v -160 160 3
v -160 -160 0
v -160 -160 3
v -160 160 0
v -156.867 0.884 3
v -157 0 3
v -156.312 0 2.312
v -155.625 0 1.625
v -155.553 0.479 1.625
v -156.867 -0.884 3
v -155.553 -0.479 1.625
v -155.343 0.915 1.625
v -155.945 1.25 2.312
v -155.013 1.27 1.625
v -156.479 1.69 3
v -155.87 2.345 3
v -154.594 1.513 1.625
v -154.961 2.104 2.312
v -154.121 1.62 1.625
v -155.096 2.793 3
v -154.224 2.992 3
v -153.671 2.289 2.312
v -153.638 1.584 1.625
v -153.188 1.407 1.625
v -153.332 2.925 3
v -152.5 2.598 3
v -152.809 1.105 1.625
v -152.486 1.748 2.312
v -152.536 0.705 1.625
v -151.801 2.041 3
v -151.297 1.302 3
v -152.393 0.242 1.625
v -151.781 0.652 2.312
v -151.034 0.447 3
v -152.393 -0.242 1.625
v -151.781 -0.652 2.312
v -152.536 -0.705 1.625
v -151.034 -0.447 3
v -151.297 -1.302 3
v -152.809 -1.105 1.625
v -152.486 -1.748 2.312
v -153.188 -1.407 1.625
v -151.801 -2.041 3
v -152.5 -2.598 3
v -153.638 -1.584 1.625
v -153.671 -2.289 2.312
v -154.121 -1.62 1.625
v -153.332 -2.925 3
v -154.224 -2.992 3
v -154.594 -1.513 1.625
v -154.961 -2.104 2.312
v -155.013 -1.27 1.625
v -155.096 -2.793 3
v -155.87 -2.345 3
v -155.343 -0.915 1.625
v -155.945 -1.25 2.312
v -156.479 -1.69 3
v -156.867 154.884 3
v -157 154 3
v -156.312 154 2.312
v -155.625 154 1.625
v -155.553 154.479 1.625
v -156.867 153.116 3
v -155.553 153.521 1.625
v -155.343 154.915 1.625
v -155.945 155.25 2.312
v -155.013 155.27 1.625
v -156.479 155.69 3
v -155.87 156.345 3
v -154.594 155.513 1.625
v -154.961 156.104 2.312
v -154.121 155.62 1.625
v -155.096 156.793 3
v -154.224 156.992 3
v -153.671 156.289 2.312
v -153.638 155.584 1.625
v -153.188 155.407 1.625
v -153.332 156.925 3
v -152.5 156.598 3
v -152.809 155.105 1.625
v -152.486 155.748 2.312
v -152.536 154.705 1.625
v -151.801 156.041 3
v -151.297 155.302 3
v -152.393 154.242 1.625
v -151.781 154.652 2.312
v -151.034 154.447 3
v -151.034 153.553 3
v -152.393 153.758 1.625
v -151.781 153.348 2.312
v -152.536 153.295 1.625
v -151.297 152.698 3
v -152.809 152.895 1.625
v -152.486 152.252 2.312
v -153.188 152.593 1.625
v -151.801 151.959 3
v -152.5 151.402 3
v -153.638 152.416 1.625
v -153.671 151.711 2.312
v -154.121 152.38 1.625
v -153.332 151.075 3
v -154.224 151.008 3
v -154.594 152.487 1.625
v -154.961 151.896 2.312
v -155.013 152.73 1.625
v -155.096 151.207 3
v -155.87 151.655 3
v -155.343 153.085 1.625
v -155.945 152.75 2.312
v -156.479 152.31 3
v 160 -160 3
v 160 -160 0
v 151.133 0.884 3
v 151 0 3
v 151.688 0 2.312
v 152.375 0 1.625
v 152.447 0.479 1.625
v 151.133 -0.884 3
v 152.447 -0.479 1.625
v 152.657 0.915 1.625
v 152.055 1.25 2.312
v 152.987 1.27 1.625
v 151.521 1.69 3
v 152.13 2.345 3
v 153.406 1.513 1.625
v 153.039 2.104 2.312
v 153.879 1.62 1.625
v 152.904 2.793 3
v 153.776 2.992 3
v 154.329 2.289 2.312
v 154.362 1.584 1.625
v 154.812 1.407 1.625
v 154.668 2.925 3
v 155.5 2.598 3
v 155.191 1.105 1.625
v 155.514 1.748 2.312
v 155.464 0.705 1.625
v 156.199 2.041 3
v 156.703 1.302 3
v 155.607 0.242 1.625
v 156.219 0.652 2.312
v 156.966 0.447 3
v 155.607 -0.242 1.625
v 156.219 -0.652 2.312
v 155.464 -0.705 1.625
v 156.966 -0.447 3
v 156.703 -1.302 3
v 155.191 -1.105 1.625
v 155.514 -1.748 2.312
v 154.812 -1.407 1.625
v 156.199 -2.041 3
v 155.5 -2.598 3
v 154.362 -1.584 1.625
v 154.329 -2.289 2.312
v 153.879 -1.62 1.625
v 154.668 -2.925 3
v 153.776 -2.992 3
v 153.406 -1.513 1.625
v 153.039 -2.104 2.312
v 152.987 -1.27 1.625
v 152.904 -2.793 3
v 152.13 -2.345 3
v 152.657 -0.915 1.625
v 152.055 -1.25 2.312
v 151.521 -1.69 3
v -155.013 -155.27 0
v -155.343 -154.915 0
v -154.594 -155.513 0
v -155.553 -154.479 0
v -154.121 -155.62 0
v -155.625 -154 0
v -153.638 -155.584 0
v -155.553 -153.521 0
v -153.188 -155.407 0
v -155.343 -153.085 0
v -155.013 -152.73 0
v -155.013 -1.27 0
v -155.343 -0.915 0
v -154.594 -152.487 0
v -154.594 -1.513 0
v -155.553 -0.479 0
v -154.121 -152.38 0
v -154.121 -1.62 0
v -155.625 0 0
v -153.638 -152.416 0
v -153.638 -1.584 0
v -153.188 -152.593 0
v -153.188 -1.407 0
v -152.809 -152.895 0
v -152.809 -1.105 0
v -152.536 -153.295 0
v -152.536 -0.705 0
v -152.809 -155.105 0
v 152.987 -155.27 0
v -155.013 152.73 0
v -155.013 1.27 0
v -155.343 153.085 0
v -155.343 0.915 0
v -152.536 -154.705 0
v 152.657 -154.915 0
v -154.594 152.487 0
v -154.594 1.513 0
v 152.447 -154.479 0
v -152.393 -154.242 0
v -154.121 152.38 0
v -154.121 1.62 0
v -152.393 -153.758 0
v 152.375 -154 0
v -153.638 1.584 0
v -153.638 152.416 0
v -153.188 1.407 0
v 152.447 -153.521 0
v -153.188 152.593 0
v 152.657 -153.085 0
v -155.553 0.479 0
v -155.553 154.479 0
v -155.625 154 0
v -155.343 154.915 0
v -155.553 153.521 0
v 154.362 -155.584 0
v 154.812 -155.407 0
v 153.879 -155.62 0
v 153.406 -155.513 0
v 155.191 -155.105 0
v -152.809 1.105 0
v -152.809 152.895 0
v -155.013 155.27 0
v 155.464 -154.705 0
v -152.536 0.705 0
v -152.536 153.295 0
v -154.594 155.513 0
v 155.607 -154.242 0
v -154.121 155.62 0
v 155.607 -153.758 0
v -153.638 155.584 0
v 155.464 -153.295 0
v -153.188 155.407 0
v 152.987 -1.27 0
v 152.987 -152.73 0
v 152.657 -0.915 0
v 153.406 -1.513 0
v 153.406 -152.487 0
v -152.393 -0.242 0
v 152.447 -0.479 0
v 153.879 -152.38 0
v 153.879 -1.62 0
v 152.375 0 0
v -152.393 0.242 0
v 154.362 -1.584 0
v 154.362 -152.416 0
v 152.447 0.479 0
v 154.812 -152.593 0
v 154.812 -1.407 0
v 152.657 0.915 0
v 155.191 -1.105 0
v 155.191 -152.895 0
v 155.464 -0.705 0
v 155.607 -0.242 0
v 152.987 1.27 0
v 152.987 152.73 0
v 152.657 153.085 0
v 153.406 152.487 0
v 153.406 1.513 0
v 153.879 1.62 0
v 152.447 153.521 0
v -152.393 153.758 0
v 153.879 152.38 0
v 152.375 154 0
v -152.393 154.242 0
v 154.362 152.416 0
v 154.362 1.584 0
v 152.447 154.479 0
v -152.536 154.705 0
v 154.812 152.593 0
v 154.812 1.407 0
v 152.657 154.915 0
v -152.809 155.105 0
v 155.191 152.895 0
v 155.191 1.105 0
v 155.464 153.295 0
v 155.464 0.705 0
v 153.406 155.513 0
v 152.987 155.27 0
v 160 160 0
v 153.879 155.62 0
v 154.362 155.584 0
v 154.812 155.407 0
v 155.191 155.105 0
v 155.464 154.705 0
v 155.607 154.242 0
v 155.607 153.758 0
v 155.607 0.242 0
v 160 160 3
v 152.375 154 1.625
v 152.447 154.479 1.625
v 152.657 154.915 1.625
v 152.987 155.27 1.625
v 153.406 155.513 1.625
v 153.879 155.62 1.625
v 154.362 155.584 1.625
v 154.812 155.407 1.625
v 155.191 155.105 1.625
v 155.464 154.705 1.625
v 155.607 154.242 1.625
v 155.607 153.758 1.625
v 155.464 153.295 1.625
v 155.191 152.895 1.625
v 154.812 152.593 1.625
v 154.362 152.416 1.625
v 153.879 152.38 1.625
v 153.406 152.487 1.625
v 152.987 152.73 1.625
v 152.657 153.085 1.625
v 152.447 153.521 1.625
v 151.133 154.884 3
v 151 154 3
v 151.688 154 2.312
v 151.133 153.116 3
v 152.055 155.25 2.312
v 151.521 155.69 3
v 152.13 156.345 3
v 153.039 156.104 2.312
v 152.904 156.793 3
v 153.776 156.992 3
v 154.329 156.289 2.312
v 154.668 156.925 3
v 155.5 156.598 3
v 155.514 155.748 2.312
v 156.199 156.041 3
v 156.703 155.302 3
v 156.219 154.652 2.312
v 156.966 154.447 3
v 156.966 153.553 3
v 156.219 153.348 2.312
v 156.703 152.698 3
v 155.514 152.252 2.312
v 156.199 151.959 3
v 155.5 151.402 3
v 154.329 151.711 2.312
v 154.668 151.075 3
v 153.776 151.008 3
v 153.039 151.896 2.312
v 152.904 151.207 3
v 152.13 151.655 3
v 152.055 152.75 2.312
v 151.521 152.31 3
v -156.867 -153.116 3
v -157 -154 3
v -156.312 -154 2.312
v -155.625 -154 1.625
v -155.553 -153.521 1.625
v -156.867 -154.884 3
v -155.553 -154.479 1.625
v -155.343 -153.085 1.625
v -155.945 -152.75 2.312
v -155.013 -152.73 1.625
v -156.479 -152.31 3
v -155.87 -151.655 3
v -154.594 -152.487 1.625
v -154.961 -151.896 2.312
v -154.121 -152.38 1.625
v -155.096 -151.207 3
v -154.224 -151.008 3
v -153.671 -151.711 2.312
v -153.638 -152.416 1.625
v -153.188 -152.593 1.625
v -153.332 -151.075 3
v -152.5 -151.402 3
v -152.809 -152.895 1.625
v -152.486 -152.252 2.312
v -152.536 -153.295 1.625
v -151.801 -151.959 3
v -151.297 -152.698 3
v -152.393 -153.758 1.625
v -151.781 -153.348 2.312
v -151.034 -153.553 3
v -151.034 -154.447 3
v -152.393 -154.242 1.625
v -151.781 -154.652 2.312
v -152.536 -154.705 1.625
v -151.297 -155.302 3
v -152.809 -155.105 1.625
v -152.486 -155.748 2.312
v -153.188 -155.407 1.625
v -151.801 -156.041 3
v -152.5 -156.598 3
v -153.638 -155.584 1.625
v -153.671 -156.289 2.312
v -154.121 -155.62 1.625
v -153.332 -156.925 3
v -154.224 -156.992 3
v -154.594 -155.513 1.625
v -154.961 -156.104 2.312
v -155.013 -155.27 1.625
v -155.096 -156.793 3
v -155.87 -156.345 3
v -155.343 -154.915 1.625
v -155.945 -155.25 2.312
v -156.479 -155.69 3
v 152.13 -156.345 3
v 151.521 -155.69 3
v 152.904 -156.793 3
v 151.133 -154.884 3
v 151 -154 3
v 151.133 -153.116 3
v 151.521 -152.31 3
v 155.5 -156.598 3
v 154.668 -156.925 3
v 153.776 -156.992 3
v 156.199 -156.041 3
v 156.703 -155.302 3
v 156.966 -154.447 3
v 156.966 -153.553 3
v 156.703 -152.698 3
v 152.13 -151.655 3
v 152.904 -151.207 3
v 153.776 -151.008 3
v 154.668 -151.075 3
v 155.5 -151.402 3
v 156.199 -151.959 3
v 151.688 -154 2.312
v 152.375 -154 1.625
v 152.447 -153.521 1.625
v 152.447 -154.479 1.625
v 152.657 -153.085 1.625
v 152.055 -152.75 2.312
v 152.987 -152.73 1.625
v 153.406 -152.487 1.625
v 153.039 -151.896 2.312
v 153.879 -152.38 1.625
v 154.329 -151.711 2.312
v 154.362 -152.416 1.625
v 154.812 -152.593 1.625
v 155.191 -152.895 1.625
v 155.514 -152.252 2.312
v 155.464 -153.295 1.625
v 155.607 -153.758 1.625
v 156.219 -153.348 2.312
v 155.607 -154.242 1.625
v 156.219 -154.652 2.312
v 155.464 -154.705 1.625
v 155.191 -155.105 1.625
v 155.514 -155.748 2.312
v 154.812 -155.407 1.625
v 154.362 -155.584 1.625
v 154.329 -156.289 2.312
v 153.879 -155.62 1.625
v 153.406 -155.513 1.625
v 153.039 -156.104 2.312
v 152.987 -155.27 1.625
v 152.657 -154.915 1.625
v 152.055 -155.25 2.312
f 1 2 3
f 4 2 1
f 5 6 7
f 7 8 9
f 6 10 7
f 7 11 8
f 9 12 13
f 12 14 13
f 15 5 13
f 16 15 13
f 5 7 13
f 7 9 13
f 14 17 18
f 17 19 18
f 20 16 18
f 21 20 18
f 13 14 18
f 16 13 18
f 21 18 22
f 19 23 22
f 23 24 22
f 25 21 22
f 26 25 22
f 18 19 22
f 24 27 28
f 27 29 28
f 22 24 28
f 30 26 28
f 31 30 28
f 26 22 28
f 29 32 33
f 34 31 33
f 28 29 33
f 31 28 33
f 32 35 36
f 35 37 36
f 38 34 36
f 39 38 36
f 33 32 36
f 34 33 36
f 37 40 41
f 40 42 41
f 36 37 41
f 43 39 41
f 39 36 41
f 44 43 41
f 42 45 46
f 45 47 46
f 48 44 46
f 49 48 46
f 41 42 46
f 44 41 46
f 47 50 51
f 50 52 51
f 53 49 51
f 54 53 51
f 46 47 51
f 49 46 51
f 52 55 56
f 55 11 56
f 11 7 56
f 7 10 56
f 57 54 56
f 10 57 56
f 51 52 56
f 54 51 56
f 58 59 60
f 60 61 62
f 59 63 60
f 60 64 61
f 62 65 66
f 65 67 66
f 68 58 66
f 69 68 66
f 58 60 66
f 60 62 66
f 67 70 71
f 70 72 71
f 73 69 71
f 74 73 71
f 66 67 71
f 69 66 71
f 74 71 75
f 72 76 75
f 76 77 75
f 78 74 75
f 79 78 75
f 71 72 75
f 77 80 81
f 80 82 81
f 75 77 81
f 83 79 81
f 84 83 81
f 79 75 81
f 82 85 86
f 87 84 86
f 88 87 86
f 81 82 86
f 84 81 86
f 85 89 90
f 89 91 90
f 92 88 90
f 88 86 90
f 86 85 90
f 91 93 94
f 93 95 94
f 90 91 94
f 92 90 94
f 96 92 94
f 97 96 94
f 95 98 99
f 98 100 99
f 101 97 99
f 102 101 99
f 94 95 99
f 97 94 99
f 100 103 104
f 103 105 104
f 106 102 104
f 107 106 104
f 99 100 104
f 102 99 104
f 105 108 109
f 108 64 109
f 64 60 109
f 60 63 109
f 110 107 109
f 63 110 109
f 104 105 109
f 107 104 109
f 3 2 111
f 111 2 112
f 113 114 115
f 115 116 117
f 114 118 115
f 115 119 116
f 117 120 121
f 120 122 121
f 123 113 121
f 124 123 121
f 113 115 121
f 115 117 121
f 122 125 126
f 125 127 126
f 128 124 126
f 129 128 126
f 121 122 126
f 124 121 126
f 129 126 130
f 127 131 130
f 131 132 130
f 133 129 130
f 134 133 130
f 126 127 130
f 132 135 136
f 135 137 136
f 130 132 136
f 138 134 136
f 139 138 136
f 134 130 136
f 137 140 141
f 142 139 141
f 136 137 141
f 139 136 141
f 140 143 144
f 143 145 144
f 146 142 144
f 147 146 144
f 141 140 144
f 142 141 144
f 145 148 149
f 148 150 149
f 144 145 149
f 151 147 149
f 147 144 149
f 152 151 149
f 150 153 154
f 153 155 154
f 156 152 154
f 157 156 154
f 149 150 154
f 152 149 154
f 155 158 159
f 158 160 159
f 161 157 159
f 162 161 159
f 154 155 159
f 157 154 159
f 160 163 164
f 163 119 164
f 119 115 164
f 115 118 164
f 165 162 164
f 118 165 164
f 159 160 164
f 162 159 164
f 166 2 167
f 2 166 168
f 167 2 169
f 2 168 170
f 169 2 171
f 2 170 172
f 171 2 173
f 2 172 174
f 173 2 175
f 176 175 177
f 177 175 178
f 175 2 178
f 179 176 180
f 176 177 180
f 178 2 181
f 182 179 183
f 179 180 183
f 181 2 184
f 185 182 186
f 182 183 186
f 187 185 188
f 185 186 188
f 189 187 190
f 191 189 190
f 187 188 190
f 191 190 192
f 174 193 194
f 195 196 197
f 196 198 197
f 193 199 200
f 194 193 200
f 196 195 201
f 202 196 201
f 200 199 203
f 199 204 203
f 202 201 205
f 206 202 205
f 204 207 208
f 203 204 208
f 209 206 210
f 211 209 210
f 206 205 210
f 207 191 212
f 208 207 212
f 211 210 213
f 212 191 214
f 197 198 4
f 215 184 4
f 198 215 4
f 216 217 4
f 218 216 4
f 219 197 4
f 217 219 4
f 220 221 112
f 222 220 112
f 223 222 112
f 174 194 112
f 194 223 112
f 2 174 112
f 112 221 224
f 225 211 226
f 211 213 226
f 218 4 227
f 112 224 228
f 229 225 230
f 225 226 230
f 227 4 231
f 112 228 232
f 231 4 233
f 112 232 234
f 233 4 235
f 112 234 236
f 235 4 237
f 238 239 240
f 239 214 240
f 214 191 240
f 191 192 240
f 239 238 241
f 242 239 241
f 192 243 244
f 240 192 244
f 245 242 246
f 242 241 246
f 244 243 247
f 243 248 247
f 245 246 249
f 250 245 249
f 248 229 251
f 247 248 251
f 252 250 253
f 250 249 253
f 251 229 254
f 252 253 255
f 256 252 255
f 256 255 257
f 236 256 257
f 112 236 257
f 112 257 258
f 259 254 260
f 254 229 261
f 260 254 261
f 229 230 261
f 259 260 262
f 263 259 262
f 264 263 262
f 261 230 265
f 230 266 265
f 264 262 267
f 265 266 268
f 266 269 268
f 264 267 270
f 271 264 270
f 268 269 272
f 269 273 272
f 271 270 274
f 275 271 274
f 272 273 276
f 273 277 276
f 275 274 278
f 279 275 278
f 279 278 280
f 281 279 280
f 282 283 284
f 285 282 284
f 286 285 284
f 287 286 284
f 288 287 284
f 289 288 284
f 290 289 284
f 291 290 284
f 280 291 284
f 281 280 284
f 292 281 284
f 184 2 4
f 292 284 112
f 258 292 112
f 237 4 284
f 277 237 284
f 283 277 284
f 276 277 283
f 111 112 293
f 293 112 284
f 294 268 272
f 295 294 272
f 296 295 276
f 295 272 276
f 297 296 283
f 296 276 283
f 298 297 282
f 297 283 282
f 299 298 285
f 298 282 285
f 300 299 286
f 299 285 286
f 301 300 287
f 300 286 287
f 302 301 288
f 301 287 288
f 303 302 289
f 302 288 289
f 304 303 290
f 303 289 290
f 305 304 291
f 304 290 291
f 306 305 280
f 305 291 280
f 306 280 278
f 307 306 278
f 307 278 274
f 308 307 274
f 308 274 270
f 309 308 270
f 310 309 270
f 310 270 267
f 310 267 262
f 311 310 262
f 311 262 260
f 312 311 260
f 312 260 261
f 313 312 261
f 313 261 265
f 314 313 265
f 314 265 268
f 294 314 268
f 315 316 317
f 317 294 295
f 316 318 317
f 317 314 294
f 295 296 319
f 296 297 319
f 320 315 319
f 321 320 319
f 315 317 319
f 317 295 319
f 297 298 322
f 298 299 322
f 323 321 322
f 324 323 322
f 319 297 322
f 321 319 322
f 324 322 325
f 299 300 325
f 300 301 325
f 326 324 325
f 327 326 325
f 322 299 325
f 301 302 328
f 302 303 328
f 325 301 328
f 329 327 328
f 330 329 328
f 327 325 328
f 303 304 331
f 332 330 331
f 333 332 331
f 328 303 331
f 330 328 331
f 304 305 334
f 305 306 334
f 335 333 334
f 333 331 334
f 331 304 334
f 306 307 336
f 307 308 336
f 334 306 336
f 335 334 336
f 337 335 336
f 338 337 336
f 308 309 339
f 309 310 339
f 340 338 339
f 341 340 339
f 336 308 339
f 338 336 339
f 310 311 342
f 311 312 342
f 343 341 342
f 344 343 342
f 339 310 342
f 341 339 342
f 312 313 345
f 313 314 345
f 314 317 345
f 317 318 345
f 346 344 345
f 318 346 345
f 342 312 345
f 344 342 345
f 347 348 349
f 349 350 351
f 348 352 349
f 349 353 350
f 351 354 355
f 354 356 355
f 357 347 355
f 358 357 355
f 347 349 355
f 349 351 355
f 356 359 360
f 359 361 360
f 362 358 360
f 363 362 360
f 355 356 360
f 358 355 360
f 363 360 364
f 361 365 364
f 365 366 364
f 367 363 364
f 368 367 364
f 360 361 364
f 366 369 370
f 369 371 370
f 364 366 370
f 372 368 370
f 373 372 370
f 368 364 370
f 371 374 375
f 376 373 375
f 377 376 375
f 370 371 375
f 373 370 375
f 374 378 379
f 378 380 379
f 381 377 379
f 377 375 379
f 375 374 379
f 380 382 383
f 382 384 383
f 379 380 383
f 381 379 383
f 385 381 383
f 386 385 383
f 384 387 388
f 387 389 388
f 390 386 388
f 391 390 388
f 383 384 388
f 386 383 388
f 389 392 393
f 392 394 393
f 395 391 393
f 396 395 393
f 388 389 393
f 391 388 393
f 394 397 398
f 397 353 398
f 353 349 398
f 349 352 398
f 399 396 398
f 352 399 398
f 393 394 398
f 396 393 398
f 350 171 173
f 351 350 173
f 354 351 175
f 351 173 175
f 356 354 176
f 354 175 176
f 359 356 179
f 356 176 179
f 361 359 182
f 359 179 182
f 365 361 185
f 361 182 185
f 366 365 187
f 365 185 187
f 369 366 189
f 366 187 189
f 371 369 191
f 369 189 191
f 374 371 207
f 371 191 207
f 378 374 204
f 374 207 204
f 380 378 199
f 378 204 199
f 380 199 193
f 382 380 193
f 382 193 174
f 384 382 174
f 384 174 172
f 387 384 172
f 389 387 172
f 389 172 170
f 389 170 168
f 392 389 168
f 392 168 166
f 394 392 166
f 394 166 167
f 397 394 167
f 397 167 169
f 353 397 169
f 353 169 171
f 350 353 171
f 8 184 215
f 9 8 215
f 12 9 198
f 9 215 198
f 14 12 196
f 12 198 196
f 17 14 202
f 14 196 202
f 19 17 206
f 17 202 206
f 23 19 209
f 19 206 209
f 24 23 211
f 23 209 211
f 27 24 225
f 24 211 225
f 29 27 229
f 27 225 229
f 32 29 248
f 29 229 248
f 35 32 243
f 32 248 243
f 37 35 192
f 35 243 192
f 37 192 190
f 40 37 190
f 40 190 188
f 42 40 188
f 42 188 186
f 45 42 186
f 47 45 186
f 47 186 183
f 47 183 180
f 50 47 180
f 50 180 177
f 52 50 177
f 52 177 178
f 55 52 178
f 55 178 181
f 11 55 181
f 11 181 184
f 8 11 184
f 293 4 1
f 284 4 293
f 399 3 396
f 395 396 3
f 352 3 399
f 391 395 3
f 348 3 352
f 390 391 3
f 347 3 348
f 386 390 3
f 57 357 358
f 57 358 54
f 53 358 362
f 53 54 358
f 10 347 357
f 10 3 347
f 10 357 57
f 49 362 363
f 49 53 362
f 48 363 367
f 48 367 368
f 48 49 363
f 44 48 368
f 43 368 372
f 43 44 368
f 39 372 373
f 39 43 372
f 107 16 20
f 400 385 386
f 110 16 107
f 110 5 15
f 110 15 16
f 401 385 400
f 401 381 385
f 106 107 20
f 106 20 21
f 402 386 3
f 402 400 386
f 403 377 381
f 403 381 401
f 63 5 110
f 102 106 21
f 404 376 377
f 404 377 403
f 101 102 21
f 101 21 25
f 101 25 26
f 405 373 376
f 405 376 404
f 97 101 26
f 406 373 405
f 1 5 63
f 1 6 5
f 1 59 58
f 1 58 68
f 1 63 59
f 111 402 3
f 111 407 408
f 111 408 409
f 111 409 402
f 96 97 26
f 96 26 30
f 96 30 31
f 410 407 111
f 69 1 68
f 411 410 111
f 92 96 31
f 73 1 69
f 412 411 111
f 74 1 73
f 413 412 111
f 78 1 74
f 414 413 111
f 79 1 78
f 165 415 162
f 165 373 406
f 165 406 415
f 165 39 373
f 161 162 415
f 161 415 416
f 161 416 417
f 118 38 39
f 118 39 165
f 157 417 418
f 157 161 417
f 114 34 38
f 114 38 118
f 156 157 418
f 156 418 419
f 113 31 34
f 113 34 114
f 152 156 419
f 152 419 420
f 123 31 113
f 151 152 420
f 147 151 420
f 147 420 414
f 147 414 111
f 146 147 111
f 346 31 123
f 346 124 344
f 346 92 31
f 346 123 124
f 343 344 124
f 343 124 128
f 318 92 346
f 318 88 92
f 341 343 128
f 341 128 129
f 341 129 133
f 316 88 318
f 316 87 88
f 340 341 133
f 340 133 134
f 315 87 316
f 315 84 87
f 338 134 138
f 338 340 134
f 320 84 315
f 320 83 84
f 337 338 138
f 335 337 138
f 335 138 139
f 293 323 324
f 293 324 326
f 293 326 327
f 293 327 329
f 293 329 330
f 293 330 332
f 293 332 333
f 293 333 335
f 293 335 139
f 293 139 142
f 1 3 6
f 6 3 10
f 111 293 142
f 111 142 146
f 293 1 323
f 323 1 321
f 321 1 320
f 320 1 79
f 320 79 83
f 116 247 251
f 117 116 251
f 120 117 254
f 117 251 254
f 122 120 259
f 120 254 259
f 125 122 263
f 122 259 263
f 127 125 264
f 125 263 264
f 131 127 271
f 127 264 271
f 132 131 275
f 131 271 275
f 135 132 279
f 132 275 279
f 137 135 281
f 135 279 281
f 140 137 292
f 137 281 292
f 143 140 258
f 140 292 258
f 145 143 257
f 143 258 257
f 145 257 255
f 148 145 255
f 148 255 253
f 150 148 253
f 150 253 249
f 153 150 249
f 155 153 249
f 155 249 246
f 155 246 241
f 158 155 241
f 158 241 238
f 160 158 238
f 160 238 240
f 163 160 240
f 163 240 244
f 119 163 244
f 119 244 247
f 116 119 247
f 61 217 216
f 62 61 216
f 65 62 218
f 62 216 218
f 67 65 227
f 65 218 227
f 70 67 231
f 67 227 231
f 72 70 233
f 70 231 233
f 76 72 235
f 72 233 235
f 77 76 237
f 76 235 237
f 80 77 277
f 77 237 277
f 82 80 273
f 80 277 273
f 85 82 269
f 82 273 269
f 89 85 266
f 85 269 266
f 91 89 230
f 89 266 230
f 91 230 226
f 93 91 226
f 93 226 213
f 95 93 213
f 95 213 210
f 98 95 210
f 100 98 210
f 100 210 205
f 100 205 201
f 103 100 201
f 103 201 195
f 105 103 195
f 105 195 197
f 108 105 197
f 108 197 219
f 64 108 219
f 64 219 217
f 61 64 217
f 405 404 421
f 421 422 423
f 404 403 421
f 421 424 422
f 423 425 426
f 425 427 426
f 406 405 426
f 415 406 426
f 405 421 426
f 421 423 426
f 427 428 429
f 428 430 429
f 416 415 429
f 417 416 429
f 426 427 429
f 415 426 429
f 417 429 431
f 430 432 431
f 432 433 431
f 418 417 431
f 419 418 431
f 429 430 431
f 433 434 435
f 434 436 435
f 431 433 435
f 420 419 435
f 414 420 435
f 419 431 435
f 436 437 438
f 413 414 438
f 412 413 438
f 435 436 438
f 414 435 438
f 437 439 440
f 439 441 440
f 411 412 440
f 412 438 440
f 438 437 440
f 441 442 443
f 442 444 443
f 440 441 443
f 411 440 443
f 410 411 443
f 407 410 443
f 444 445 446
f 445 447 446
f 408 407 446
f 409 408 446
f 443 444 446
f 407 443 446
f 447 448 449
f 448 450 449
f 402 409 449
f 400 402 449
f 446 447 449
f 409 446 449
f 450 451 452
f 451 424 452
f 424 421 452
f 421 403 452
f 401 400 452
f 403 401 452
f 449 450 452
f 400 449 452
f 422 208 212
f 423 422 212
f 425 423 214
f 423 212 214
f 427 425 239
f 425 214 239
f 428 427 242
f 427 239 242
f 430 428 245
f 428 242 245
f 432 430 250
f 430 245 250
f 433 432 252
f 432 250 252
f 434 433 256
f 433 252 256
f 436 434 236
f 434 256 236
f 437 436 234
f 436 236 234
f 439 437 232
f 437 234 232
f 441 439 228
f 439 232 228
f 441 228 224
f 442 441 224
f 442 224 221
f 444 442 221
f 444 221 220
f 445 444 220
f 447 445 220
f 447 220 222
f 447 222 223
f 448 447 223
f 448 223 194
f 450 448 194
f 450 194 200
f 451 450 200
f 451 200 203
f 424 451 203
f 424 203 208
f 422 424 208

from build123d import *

# Parameters (mm, degrees)
SKETCH_W         = 320
SKETCH_H         = 320
PAD_DEPTH        = 3
HOLE_D           = 3.25
HOLE_DEPTH       = 3
HOLE_CSINK_D     = 6
HOLE_CSINK_ANGLE = 90


with BuildPart() as part:
    # Sketch → Pad (new body)
    with BuildSketch(Plane.XY):
        Rectangle(SKETCH_W, SKETCH_H)
    extrude(amount=PAD_DEPTH)

    # Hole
    with Locations(Plane.XY.offset(3)):
        with Locations((154, 154), (154, -154), (154, 0), (-154, -154), (-154, 154), (-154, 0)):
            CounterSinkHole(HOLE_D / 2, HOLE_CSINK_D / 2, depth=HOLE_DEPTH, counter_sink_angle=HOLE_CSINK_ANGLE)


solid = part.part
